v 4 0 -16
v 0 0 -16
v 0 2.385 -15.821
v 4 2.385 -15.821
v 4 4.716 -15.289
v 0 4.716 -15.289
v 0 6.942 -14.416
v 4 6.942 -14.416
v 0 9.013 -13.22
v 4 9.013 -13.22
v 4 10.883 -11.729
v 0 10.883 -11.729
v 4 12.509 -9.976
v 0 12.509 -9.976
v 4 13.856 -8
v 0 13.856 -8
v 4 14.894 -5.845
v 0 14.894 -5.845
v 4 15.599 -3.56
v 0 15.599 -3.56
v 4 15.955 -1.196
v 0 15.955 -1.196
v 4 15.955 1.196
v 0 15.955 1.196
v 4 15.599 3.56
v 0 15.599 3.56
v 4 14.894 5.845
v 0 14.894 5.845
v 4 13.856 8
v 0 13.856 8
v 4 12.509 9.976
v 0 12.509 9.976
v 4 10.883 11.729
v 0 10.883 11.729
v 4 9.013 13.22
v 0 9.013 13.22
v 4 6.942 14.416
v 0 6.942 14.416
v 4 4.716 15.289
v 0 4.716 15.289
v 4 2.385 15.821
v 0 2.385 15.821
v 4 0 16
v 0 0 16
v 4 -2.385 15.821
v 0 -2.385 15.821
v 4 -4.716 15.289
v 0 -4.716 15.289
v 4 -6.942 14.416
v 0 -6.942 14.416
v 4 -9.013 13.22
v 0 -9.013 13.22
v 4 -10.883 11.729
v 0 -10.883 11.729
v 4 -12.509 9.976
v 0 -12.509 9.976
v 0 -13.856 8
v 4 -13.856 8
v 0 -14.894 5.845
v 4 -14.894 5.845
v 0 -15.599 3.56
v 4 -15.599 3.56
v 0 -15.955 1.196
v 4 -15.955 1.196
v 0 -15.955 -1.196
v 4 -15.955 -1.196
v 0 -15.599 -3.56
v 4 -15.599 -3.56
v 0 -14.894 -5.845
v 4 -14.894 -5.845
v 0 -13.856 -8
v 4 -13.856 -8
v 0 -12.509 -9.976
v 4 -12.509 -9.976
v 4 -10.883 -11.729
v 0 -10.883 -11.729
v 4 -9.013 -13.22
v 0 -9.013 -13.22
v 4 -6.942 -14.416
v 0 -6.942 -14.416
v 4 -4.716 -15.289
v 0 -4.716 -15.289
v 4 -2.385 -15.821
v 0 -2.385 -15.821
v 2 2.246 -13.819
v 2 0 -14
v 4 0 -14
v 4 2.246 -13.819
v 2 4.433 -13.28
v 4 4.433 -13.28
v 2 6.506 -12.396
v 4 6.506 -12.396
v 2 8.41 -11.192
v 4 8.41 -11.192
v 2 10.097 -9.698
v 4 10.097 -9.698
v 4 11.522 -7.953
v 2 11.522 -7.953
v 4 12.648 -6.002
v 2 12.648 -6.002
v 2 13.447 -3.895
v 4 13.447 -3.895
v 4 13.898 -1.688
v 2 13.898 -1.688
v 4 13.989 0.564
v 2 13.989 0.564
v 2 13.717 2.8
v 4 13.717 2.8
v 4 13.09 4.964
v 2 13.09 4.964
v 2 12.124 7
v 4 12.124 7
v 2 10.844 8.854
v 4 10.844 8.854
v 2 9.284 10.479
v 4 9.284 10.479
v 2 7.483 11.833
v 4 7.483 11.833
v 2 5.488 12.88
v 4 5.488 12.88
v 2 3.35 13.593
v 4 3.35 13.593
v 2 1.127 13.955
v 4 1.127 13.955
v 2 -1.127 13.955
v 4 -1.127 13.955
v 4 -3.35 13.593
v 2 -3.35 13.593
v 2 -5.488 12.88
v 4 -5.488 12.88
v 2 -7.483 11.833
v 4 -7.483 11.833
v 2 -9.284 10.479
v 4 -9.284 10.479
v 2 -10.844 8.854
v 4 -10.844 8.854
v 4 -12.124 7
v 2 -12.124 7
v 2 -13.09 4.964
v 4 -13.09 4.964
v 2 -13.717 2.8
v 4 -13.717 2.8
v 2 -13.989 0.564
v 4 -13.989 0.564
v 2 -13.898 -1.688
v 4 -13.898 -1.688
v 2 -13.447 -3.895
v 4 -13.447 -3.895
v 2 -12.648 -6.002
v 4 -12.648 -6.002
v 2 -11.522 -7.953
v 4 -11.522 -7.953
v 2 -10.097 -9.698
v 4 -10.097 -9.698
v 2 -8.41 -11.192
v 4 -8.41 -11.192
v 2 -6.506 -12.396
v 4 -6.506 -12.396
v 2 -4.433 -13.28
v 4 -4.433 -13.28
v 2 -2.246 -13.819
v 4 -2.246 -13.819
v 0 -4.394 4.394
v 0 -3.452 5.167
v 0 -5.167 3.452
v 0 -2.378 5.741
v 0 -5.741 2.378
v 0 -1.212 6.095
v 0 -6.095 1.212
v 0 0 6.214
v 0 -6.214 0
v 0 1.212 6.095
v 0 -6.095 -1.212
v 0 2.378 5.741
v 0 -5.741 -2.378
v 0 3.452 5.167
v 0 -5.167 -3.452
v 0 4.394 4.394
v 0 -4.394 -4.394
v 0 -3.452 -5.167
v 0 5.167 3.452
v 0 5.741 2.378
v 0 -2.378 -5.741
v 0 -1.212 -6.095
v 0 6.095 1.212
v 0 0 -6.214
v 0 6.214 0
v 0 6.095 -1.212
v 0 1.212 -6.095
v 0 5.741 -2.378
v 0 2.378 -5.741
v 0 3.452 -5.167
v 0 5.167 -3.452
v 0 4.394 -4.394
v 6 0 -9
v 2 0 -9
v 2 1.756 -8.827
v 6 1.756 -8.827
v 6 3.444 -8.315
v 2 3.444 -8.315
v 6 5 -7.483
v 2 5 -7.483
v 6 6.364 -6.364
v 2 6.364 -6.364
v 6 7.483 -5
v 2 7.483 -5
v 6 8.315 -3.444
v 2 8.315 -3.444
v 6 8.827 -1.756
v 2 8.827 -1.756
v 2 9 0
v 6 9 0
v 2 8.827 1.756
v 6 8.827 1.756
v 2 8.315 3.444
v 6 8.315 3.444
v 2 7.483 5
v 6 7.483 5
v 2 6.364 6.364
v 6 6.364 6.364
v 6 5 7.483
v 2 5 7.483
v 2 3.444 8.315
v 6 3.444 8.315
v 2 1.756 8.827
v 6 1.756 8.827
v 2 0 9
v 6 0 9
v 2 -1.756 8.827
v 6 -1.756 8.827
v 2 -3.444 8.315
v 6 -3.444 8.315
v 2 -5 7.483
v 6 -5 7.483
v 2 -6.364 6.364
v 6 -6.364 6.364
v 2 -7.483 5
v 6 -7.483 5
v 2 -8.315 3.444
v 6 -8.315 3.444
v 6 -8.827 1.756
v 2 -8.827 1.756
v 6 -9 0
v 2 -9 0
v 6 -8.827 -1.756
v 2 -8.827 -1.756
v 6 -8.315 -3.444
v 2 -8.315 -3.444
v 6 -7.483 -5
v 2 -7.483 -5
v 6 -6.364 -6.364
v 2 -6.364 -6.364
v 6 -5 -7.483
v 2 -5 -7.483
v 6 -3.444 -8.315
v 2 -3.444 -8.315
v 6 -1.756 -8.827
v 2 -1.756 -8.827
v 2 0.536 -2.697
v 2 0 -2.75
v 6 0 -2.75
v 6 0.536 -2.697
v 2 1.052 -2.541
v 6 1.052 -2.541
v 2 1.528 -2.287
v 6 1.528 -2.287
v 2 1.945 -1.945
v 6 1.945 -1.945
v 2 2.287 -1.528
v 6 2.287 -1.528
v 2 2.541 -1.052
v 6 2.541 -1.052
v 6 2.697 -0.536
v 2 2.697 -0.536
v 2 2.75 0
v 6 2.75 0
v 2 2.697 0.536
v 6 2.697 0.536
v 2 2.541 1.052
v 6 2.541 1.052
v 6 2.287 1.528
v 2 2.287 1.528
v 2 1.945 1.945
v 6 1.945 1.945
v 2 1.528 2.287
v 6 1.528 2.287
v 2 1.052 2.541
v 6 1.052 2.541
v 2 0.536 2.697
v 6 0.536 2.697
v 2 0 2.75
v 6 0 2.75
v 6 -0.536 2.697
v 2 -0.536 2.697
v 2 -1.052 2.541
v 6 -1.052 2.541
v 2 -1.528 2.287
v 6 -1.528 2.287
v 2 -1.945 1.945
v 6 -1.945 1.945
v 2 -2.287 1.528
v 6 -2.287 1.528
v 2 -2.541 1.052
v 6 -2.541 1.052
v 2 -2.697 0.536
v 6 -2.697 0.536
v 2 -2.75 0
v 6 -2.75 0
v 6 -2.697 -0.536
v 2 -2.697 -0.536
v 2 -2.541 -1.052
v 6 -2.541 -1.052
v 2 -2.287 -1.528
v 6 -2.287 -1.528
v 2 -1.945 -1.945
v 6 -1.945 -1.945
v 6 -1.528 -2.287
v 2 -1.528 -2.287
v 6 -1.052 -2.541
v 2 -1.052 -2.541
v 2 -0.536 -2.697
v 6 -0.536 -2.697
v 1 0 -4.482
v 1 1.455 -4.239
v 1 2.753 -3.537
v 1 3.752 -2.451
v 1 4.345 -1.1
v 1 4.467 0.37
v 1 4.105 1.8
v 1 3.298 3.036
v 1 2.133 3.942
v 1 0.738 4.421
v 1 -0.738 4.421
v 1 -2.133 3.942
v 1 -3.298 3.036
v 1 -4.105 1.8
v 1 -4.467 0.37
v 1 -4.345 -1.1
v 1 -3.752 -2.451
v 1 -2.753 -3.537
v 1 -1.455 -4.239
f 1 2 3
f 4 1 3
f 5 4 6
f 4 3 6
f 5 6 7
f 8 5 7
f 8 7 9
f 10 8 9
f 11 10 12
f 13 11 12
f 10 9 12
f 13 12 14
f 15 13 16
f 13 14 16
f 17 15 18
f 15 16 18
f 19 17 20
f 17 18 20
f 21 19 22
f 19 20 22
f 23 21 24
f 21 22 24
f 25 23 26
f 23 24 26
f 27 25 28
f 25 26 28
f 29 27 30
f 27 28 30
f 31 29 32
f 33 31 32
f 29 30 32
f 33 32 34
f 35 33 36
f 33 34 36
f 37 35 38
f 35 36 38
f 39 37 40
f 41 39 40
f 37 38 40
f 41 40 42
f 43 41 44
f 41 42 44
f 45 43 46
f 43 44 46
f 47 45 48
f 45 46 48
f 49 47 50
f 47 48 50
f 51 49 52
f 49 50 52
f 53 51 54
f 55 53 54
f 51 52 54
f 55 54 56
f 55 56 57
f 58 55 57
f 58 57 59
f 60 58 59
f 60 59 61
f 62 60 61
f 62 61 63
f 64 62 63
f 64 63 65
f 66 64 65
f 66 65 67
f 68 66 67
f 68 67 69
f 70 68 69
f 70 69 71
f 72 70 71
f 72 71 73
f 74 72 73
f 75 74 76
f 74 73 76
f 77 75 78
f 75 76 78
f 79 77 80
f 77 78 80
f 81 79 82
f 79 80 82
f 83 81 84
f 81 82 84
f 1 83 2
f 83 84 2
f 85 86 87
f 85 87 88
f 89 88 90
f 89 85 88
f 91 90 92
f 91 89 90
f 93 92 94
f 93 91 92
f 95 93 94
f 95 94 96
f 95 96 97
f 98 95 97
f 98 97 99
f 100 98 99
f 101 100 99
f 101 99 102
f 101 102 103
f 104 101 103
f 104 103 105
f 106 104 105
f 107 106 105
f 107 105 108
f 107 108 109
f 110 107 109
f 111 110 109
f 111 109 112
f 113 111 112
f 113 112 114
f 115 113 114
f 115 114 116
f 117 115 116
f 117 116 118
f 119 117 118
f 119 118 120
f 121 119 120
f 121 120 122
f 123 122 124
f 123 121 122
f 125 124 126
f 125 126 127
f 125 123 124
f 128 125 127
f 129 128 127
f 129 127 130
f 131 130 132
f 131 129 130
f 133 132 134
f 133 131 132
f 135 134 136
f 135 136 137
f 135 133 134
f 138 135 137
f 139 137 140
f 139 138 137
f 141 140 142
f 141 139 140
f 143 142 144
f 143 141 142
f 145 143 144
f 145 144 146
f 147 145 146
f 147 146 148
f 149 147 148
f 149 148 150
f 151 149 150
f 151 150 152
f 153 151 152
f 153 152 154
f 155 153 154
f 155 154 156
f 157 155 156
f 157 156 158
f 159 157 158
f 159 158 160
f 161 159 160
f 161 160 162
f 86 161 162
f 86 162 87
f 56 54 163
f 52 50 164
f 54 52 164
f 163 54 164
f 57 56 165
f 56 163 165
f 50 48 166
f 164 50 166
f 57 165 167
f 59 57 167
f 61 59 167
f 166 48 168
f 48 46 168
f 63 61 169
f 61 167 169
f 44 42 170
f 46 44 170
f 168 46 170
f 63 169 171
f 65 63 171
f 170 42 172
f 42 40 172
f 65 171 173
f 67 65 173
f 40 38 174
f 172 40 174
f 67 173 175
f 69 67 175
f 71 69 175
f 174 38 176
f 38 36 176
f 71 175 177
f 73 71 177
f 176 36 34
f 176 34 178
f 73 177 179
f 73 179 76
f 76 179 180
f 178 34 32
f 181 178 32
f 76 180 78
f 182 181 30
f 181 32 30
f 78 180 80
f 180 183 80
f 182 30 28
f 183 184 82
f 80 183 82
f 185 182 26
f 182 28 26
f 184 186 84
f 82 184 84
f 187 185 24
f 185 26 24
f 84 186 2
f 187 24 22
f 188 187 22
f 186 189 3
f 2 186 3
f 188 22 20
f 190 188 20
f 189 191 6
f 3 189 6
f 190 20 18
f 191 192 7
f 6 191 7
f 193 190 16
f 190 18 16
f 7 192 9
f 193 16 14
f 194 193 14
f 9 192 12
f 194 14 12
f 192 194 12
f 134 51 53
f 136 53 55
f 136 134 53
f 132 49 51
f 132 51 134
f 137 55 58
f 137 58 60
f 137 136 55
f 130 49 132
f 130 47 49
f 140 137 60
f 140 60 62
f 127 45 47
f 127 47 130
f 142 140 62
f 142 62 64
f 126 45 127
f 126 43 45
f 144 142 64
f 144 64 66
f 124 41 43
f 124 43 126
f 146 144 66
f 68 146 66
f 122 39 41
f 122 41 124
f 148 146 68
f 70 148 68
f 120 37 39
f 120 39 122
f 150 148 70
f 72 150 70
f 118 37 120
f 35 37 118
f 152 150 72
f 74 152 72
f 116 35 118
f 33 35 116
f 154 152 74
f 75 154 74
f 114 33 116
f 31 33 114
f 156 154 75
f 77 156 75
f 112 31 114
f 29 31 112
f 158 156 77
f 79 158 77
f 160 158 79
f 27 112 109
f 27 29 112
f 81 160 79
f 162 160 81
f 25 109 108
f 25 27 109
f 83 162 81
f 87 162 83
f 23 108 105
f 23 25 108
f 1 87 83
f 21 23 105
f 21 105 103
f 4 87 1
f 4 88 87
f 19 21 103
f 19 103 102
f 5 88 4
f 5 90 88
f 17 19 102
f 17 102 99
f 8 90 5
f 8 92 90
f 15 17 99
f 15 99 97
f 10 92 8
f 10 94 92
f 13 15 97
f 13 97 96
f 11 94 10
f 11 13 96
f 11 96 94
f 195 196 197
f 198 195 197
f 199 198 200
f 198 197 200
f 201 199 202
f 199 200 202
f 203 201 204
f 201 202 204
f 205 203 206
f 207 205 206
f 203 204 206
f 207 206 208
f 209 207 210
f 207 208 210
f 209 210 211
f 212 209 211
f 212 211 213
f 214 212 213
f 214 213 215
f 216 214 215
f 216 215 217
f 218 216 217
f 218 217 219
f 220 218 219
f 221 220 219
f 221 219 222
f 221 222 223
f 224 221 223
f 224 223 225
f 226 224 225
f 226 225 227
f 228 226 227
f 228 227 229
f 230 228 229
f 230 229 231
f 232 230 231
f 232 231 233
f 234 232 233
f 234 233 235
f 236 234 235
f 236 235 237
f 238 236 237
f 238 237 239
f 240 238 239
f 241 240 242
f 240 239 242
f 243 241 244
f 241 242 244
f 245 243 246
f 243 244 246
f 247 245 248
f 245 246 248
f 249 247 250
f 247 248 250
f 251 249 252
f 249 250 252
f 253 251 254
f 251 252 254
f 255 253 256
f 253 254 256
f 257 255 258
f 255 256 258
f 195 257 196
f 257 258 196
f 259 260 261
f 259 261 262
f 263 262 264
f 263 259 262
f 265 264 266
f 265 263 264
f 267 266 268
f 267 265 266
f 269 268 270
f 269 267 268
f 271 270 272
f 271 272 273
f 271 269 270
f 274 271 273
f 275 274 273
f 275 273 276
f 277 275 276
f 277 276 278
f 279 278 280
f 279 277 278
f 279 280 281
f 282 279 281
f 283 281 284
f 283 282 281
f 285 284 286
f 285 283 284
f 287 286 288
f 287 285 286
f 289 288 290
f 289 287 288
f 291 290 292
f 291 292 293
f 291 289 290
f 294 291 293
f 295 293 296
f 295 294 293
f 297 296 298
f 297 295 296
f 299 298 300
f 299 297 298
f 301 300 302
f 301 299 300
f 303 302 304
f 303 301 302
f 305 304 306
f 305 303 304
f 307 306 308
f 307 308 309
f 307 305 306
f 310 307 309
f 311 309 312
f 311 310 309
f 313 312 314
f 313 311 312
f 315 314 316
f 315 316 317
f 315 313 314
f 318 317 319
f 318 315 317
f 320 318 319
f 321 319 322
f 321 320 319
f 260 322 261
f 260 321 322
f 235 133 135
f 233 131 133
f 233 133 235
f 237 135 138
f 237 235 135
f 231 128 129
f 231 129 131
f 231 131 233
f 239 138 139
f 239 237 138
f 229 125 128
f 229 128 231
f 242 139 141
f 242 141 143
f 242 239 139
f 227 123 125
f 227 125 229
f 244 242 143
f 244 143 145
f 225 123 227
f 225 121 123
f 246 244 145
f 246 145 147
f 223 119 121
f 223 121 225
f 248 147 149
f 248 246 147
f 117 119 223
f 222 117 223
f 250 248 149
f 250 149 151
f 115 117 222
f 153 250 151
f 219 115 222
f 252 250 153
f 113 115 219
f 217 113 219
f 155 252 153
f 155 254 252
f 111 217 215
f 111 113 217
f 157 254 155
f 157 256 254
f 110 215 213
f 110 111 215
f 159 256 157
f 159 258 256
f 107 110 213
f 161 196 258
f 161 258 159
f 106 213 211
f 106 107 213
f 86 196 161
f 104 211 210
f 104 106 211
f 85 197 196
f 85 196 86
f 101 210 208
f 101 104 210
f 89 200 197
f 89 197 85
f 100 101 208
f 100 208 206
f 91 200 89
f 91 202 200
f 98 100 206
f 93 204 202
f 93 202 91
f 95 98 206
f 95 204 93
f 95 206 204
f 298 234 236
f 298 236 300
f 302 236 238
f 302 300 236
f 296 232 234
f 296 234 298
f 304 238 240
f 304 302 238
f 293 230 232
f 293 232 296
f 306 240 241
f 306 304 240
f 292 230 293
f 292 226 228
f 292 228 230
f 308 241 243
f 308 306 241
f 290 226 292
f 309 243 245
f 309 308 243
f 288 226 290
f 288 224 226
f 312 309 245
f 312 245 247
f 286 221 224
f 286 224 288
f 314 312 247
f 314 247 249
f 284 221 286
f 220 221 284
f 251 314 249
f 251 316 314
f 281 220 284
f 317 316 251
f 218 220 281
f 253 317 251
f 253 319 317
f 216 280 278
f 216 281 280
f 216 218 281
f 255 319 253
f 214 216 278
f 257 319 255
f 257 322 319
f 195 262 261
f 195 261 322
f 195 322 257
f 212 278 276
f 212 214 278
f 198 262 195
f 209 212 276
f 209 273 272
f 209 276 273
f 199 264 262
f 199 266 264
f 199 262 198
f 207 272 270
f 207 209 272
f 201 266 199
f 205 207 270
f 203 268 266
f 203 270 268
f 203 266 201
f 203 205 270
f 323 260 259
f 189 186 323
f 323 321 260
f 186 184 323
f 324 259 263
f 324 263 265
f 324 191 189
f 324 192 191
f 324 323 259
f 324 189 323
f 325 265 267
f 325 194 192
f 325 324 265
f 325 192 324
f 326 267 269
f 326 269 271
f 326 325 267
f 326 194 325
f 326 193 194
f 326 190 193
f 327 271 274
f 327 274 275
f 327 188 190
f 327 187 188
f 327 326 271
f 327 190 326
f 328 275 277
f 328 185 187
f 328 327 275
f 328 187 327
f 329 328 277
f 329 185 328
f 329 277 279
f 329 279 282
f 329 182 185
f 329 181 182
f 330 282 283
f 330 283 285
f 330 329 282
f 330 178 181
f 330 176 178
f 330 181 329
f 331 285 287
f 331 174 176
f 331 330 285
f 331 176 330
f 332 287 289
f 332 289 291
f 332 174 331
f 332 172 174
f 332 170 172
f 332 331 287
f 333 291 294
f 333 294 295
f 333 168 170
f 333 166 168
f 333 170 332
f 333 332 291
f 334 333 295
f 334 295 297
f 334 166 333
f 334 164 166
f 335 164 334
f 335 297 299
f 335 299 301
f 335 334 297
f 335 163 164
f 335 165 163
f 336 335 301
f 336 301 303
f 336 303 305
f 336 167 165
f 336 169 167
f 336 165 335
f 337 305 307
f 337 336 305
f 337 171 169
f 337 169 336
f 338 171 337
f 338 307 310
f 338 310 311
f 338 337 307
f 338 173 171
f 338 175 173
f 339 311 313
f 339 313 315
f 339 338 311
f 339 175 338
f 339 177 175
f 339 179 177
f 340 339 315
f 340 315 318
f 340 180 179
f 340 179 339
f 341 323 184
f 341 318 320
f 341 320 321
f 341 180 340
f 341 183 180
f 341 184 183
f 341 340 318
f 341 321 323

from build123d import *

# Parameters (mm, degrees)
SKETCH_1_R      = 14
SKETCH_1_R_2    = 9
EXTRUDE_1_DEPTH = 2
SKETCH_1_3_R    = 16
SKETCH_1_3_R_2  = 14
EXTRUDE_2_DEPTH = 4
SKETCH_1_4_R    = 9
SKETCH_1_4_R_2  = 2.75
EXTRUDE_3_DEPTH = 6
CHAMFER_1_SIZE  = 2
CHAMFER_1_SIZE2 = 3.464101615


with BuildPart() as part:
    # 草图1 → 凸台-拉伸1 (new body)
    with BuildSketch(Plane(origin=(0, 0, 0), x_dir=(0, 0, -1), z_dir=(1, 0, 0))):
        Circle(SKETCH_1_R)
        Circle(SKETCH_1_R_2, mode=Mode.SUBTRACT)
    extrude(amount=EXTRUDE_1_DEPTH)

    # 草图1<3> → 凸台-拉伸2 (add)
    with BuildSketch(Plane(origin=(0, 0, 0), x_dir=(0, 0, -1), z_dir=(1, 0, 0))):
        Circle(SKETCH_1_3_R)
        Circle(SKETCH_1_3_R_2, mode=Mode.SUBTRACT)
    extrude(amount=EXTRUDE_2_DEPTH)

    # 草图1<4> → 凸台-拉伸3 (add)
    with BuildSketch(Plane(origin=(0, 0, 0), x_dir=(0, 0, -1), z_dir=(1, 0, 0))):
        Circle(SKETCH_1_4_R)
        Circle(SKETCH_1_4_R_2, mode=Mode.SUBTRACT)
    extrude(amount=EXTRUDE_3_DEPTH)

    # 倒角1
    chamfer_1_edges = [part.edges().sort_by_distance(p)[0] for p in [
        (0, 0, 2.75),
    ]]
    chamfer_1_side = [part.faces().sort_by_distance(p)[0] for p in [
        (3, 0, 2.75),
    ]]
    chamfer(chamfer_1_edges, length=CHAMFER_1_SIZE, length2=CHAMFER_1_SIZE2, reference=chamfer_1_side[0])


solid = part.part
